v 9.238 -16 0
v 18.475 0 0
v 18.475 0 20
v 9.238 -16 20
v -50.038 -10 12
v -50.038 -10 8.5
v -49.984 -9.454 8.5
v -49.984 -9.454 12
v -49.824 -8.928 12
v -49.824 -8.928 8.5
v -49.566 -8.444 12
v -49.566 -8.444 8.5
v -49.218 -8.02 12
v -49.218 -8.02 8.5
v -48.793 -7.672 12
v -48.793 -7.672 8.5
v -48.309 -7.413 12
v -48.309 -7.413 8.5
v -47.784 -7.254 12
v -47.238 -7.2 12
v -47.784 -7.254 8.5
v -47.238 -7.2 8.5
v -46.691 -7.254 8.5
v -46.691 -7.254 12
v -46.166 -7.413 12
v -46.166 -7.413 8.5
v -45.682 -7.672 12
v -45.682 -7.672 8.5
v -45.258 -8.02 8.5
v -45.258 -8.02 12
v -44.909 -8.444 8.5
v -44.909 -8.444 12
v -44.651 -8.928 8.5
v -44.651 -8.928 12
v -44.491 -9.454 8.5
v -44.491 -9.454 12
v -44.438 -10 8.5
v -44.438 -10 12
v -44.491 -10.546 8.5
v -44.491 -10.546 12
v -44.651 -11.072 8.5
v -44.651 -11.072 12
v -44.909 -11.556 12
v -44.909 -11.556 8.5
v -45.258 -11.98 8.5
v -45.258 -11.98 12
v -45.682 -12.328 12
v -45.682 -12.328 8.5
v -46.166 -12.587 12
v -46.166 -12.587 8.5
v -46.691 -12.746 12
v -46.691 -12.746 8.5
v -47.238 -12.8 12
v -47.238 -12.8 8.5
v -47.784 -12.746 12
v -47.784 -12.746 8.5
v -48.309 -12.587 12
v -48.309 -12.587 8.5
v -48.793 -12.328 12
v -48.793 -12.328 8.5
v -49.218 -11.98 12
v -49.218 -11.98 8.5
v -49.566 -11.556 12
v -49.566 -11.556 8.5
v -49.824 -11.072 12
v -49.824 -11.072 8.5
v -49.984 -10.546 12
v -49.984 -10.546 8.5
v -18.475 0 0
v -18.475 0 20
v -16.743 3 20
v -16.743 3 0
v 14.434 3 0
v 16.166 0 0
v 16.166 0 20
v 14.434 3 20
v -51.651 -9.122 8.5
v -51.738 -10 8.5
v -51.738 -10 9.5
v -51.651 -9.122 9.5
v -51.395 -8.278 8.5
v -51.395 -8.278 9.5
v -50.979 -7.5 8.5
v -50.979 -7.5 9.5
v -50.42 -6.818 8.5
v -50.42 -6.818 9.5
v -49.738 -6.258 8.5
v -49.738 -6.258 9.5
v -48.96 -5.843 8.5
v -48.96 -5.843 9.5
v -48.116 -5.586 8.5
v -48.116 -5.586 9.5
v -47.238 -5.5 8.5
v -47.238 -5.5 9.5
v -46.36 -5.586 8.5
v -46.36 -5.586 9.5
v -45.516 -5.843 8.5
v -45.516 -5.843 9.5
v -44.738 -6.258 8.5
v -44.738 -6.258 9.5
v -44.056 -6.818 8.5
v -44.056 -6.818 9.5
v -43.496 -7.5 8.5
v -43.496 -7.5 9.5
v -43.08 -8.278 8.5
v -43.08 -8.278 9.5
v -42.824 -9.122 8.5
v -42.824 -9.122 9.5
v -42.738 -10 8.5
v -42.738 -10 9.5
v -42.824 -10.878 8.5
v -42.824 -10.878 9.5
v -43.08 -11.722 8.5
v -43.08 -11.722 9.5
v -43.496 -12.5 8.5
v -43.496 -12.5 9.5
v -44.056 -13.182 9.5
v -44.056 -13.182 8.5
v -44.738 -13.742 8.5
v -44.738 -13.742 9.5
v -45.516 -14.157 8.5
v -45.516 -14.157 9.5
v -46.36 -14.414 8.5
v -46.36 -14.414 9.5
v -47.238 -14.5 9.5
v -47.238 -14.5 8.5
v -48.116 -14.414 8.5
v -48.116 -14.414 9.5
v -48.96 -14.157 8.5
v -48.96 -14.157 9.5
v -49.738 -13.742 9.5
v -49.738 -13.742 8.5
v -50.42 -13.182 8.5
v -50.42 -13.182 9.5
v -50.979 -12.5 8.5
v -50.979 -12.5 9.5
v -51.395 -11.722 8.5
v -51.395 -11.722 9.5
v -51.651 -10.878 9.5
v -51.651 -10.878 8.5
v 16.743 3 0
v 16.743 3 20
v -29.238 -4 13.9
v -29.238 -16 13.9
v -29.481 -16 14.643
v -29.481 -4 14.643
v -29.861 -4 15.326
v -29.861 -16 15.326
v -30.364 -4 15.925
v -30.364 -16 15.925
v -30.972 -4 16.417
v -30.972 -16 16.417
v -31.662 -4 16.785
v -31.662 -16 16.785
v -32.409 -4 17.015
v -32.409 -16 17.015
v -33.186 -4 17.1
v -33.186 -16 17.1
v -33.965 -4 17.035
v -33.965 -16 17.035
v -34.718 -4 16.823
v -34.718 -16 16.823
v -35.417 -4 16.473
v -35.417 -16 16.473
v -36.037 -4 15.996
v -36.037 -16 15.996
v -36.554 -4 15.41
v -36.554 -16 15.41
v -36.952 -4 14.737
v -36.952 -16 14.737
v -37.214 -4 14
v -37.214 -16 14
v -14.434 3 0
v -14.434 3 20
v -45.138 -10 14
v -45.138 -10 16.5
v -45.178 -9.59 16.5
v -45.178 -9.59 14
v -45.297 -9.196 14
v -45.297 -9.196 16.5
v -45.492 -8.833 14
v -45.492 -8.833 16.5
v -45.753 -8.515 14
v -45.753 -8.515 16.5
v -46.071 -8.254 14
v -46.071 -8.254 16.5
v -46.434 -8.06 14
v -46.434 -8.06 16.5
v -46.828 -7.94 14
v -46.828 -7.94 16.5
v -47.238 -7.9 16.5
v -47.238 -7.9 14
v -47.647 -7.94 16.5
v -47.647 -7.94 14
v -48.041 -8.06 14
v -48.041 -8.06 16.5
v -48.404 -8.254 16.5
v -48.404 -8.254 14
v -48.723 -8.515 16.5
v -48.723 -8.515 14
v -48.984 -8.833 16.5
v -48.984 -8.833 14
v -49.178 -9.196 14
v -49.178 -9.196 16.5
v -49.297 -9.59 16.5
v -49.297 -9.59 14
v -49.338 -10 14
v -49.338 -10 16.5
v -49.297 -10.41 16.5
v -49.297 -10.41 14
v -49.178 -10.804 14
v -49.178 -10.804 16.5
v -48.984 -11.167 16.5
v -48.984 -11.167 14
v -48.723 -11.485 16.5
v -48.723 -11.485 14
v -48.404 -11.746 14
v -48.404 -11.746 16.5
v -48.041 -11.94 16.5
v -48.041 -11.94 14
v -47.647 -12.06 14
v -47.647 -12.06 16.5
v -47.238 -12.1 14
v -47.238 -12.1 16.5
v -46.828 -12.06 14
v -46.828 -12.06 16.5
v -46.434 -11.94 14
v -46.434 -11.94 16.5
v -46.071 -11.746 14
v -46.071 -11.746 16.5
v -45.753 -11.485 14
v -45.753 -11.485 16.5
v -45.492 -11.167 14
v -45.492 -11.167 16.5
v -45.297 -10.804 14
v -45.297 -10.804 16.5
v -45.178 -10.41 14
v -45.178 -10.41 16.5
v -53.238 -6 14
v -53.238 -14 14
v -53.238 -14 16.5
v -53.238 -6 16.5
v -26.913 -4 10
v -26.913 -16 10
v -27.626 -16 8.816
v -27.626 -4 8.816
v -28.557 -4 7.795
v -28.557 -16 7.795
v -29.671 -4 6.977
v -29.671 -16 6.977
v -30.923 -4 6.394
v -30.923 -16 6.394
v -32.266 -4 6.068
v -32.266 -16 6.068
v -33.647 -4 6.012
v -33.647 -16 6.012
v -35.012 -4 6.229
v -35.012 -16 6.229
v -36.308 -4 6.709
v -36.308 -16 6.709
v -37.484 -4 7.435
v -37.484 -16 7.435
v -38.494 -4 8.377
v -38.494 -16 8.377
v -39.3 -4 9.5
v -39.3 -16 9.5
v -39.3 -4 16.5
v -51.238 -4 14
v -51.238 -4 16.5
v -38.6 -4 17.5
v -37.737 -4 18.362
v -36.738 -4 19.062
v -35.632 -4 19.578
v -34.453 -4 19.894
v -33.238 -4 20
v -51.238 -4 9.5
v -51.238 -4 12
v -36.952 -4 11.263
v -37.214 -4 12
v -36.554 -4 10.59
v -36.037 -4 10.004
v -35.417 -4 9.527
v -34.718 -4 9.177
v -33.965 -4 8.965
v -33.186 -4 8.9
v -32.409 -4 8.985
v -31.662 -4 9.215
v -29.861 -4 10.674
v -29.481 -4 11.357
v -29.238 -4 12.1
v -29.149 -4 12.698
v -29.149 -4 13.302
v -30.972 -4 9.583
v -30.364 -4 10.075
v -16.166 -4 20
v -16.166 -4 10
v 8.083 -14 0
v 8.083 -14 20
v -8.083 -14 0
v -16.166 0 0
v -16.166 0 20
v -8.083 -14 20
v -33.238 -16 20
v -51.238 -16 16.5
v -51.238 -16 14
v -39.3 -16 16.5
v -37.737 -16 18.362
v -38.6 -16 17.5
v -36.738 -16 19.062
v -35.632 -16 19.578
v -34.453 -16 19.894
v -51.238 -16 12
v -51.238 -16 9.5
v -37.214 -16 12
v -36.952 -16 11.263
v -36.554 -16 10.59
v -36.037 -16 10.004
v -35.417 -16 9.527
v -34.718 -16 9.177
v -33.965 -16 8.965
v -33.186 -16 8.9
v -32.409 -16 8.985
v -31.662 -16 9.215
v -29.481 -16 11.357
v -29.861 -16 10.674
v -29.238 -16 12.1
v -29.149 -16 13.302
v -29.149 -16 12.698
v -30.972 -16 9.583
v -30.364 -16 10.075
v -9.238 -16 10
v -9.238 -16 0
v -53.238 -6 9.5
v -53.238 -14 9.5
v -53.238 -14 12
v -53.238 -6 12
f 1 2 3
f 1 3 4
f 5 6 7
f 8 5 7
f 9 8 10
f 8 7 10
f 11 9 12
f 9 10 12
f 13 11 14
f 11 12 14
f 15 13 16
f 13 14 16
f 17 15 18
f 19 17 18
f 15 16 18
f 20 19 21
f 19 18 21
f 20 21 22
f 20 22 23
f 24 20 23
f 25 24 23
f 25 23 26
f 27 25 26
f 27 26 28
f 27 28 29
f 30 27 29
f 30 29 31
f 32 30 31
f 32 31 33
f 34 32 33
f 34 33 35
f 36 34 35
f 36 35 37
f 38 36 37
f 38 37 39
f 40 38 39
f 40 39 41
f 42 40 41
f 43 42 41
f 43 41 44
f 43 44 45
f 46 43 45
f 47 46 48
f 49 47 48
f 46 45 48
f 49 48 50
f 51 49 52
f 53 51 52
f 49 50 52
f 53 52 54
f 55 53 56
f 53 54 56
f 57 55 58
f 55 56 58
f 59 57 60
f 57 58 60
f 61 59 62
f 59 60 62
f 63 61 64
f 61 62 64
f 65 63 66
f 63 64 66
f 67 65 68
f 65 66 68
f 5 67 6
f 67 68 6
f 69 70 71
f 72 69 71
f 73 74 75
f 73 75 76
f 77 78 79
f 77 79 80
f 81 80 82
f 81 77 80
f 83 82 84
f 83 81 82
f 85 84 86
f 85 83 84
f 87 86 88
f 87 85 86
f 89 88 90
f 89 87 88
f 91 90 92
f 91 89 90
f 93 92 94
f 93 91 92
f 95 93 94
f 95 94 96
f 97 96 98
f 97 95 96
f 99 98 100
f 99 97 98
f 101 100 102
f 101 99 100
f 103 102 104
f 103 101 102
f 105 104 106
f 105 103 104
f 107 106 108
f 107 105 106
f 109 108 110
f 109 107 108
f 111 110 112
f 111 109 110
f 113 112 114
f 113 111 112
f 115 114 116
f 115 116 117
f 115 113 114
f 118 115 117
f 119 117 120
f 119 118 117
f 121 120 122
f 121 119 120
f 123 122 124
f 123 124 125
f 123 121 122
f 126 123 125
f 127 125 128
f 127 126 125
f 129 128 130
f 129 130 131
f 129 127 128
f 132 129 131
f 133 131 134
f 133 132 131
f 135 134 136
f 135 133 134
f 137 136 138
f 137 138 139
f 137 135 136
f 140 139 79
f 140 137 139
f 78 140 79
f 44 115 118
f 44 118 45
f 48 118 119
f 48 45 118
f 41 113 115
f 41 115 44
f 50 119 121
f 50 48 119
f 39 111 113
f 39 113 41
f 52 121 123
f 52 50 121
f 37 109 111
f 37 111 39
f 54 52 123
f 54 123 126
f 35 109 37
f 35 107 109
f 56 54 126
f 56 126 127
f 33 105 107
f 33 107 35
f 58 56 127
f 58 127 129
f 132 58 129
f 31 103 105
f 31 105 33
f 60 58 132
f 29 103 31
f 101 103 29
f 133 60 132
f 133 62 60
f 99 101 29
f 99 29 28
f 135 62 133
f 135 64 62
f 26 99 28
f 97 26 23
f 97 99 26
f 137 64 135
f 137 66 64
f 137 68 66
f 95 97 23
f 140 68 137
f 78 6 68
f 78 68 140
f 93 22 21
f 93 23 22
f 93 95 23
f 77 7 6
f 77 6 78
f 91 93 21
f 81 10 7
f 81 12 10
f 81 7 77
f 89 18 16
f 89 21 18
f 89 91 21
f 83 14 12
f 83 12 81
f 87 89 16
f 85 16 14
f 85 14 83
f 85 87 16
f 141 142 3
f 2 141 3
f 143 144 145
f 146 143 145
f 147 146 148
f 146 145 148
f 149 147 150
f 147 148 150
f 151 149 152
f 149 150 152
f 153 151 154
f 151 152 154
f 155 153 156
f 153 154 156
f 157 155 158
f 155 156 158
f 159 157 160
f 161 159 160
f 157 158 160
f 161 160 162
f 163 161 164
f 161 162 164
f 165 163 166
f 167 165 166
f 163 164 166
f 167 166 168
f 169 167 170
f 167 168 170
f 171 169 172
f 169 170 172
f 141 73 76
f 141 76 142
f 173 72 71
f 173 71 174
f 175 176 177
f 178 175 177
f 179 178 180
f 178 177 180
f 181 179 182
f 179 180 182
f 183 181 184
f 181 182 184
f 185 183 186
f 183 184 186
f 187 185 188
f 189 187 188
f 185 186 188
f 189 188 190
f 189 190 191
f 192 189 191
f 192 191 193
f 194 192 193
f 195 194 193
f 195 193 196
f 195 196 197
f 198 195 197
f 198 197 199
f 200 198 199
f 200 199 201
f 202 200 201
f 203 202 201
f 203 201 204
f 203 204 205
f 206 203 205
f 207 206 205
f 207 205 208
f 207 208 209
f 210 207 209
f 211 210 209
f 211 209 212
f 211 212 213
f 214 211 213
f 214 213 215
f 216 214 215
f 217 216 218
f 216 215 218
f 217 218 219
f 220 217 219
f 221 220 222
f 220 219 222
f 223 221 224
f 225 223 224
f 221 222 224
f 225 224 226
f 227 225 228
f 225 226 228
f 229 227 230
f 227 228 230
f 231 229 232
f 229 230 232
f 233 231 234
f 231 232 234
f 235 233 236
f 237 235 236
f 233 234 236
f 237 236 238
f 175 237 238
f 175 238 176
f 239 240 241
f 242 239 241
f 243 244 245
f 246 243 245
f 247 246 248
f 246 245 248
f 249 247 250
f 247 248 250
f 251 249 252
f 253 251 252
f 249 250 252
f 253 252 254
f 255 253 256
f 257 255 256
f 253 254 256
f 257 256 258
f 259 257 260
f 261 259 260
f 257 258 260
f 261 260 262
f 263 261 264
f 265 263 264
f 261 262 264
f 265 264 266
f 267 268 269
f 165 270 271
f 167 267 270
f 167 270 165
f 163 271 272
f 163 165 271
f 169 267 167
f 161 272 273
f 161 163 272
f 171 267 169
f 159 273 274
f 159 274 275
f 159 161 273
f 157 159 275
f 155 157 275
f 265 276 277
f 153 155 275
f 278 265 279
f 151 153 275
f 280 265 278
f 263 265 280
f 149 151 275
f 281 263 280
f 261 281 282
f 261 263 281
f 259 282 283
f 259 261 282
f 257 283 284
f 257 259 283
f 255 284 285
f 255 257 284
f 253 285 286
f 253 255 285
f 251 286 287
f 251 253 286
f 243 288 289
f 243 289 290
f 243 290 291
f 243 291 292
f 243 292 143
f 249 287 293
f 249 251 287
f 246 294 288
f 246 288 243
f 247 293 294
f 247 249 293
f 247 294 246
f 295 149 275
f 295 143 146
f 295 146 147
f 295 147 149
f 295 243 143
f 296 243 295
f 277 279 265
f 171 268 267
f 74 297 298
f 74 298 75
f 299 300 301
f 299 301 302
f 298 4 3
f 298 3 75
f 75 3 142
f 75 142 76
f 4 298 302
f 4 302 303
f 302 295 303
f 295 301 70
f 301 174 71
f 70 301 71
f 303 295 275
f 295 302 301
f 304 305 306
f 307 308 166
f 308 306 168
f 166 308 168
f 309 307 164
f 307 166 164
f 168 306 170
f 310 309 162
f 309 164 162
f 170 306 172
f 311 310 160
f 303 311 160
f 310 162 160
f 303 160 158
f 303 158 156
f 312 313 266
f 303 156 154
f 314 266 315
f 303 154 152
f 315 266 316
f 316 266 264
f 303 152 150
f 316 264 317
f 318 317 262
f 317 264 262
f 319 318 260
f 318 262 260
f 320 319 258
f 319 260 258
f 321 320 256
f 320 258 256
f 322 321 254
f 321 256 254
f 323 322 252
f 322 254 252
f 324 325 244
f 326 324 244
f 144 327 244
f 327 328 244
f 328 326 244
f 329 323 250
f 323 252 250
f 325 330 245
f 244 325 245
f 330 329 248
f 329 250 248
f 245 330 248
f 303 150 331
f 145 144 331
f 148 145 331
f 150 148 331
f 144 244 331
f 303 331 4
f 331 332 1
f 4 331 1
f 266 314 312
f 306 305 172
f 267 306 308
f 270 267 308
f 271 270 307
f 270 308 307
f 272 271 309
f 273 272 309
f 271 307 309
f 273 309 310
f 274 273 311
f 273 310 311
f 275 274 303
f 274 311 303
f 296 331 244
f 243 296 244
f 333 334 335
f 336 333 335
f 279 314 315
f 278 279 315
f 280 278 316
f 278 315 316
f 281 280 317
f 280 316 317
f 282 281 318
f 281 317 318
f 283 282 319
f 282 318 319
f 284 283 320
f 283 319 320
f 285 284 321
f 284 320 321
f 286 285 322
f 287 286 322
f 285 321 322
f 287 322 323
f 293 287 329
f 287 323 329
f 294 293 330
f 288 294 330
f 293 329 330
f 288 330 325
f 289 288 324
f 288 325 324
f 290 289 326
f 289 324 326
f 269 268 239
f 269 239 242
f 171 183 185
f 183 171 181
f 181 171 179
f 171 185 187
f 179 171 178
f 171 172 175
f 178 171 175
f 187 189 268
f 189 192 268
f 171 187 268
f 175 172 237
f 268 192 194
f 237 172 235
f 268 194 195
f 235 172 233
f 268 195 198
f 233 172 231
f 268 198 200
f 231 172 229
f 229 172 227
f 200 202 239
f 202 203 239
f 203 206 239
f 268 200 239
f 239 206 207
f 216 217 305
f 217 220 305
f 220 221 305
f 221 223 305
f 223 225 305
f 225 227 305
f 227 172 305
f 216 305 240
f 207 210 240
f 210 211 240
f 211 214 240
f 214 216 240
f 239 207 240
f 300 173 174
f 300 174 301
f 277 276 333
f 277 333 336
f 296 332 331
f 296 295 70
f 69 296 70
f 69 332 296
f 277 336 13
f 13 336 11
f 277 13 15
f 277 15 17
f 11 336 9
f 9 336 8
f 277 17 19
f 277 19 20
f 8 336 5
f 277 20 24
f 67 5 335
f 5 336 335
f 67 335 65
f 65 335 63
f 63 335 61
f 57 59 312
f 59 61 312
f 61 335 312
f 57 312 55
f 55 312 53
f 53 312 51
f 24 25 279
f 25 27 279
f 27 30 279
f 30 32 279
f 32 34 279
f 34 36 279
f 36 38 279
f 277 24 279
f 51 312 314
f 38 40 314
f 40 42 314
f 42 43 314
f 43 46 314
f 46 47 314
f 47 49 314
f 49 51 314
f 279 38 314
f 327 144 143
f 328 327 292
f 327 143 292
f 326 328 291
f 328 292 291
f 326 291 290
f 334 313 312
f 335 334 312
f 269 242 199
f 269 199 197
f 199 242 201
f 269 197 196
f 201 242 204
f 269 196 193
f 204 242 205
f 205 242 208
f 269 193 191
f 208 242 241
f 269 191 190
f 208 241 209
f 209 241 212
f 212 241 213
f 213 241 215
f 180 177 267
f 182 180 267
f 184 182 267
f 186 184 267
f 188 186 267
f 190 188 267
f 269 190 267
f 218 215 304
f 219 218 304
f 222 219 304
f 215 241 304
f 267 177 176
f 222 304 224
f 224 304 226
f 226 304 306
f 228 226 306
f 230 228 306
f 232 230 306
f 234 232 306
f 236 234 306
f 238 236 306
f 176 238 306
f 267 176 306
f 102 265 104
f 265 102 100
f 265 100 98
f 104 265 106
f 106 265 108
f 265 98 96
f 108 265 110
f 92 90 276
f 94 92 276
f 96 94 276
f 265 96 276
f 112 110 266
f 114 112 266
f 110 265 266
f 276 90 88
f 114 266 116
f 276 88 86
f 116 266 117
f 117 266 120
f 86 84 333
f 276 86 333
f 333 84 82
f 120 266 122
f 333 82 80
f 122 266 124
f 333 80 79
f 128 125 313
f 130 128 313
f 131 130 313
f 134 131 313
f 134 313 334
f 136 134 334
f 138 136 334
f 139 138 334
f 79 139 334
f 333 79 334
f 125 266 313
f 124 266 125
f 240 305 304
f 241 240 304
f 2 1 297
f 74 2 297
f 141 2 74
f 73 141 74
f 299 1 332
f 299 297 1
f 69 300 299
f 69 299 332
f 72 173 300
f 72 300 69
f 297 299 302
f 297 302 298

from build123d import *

# Parameters (mm, degrees)
P_IDAT_VYSUNUT_M1_DEPTH  = 20
P_IDAT_VYSUNUT_M2_DEPTH  = 10
P_IDAT_START             = -16
P_IDAT_VYSUNUT_M3_DEPTH  = 12
ODEBRAT_START            = -4
SKICA4_R                 = 4.1
ODEBRAT_VYSUNUT_M1_DEPTH = 56.078274453
ODEBRAT_VYSUNUT_M5_REACH = 59.987
SKICA11_R                = 2.1
ODEBRAT_VYSUNUT_M6_REACH = 58.573
SKICA12_R                = 2.8
ZKOSEN_2_SIZE            = 2
P_IDAT_START_2           = 1
SKICA13_R                = 4.5
SKICA13_R_2              = 2.8
P_IDAT_VYSUNUT_M5_DEPTH  = 1


with BuildPart() as part:
    # Skica1 → Přidat vysunutím1 (new body)
    with BuildSketch(Plane.XY):
        Polygon((-14.43375673, 3), (-16.165807537, 0), (-8.082903769, -14), (8.082903769, -14), (16.165807537, 0), (14.43375673, 3), (16.743157806, 3), (18.475208614, 0), (9.237604307, -16), (-9.237604307, -16), (-18.475208614, 0), (-16.743157806, 3), align=None)
    extrude(amount=P_IDAT_VYSUNUT_M1_DEPTH)

    # Skica2 → Přidat vysunutím2 (add)
    with BuildSketch(Plane.XY.offset(10)):
        Polygon((-9.237604307, -16), (-29.237604307, -16), (-29.237604307, -4), (-16.165807537, -4), align=None)
    extrude(amount=P_IDAT_VYSUNUT_M2_DEPTH)

    # Skica3 → Přidat vysunutím3 (add)
    with BuildSketch(Plane(origin=(0, 0, 0), x_dir=(1, 0, 0), z_dir=(0, 1, 0)).offset(P_IDAT_START)):
        with BuildLine():
            Line((-29.237604307, -12.1), (-29.237604307, -10))
            Line((-29.237604307, -10), (-26.913048987, -10))
            ThreePointArc((-26.913048987, -10), (-32.955273849, -6.005695924), (-39.299782134, -9.5))
            Line((-39.299782134, -9.5), (-53.237604307, -9.5))
            Line((-53.237604307, -9.5), (-53.237604307, -12))
            Line((-53.237604307, -12), (-37.213783377, -12))
            ThreePointArc((-37.213783377, -12), (-33.186205288, -8.900322191), (-29.237604307, -12.1))
        make_face()
        with BuildLine():
            Line((-53.237604307, -14), (-53.237604307, -16.5))
            Line((-53.237604307, -16.5), (-39.299782134, -16.5))
            ThreePointArc((-39.299782134, -16.5), (-36.737604307, -19.062177826), (-33.237604307, -20))
            Line((-33.237604307, -20), (-29.237604307, -20))
            Line((-29.237604307, -20), (-29.237604307, -13.9))
            ThreePointArc((-29.237604307, -13.9), (-33.186205288, -17.099677809), (-37.213783377, -14))
            Line((-37.213783377, -14), (-53.237604307, -14))
        make_face()
    extrude(amount=P_IDAT_VYSUNUT_M3_DEPTH)

    # Skica4 → Odebrat vysunutím1 (cut, through all)
    with BuildSketch(Plane(origin=(0, 0, 0), x_dir=(1, 0, 0), z_dir=(0, 1, 0)).offset(ODEBRAT_START)):
        with Locations((-33.237604307, -13)):
            Circle(SKICA4_R)
    extrude(amount=-ODEBRAT_VYSUNUT_M1_DEPTH, mode=Mode.SUBTRACT)

    # Skica11 → Odebrat vysunutím5 (cut, up to next)
    with BuildSketch(Plane.XY.offset(16.5), mode=Mode.PRIVATE) as odebrat_vysunut_m5_sk1:
        with Locations((-47.237604307, -10)):
            Circle(SKICA11_R)
    odebrat_vysunut_m5_tool1 = extrude(odebrat_vysunut_m5_sk1.sketch, amount=-ODEBRAT_VYSUNUT_M5_REACH, mode=Mode.PRIVATE) & part.part
    add(odebrat_vysunut_m5_tool1.solids().sort_by_distance((-47.237604, -10, 16.5))[0], mode=Mode.SUBTRACT)

    # Skica12 → Odebrat vysunutím6 (cut, up to next)
    with BuildSketch(Plane(origin=(0, 0, 9.5), x_dir=(-1, 0, 0), z_dir=(0, 0, -1)), mode=Mode.PRIVATE) as odebrat_vysunut_m6_sk1:
        with Locations((47.237604307, -10)):
            Circle(SKICA12_R)
    odebrat_vysunut_m6_tool1 = extrude(odebrat_vysunut_m6_sk1.sketch, amount=-ODEBRAT_VYSUNUT_M6_REACH, mode=Mode.PRIVATE) & part.part
    add(odebrat_vysunut_m6_tool1.solids().sort_by_distance((-47.237604, -10, 9.5))[0], mode=Mode.SUBTRACT)

    # Zkosení2
    zkosen_2_edges = [part.edges().sort_by_distance(p)[0] for p in [
        (-53.237604307, -4, 10.75),
        (-53.237604307, -16, 10.75),
        (-53.237604307, -4, 15.25),
        (-53.237604307, -16, 15.25),
    ]]
    chamfer(zkosen_2_edges, length=ZKOSEN_2_SIZE)

    # Skica13 → Přidat vysunutím5 (add)
    with BuildSketch(Plane(origin=(0, 0, 9.5), x_dir=(-1, 0, 0), z_dir=(0, 0, -1)).offset(P_IDAT_START_2)):
        with Locations((47.237604307, -10)):
            Circle(SKICA13_R)
        with Locations((47.237604307, -10)):
            Circle(SKICA13_R_2, mode=Mode.SUBTRACT)
    extrude(amount=-P_IDAT_VYSUNUT_M5_DEPTH)


solid = part.part
